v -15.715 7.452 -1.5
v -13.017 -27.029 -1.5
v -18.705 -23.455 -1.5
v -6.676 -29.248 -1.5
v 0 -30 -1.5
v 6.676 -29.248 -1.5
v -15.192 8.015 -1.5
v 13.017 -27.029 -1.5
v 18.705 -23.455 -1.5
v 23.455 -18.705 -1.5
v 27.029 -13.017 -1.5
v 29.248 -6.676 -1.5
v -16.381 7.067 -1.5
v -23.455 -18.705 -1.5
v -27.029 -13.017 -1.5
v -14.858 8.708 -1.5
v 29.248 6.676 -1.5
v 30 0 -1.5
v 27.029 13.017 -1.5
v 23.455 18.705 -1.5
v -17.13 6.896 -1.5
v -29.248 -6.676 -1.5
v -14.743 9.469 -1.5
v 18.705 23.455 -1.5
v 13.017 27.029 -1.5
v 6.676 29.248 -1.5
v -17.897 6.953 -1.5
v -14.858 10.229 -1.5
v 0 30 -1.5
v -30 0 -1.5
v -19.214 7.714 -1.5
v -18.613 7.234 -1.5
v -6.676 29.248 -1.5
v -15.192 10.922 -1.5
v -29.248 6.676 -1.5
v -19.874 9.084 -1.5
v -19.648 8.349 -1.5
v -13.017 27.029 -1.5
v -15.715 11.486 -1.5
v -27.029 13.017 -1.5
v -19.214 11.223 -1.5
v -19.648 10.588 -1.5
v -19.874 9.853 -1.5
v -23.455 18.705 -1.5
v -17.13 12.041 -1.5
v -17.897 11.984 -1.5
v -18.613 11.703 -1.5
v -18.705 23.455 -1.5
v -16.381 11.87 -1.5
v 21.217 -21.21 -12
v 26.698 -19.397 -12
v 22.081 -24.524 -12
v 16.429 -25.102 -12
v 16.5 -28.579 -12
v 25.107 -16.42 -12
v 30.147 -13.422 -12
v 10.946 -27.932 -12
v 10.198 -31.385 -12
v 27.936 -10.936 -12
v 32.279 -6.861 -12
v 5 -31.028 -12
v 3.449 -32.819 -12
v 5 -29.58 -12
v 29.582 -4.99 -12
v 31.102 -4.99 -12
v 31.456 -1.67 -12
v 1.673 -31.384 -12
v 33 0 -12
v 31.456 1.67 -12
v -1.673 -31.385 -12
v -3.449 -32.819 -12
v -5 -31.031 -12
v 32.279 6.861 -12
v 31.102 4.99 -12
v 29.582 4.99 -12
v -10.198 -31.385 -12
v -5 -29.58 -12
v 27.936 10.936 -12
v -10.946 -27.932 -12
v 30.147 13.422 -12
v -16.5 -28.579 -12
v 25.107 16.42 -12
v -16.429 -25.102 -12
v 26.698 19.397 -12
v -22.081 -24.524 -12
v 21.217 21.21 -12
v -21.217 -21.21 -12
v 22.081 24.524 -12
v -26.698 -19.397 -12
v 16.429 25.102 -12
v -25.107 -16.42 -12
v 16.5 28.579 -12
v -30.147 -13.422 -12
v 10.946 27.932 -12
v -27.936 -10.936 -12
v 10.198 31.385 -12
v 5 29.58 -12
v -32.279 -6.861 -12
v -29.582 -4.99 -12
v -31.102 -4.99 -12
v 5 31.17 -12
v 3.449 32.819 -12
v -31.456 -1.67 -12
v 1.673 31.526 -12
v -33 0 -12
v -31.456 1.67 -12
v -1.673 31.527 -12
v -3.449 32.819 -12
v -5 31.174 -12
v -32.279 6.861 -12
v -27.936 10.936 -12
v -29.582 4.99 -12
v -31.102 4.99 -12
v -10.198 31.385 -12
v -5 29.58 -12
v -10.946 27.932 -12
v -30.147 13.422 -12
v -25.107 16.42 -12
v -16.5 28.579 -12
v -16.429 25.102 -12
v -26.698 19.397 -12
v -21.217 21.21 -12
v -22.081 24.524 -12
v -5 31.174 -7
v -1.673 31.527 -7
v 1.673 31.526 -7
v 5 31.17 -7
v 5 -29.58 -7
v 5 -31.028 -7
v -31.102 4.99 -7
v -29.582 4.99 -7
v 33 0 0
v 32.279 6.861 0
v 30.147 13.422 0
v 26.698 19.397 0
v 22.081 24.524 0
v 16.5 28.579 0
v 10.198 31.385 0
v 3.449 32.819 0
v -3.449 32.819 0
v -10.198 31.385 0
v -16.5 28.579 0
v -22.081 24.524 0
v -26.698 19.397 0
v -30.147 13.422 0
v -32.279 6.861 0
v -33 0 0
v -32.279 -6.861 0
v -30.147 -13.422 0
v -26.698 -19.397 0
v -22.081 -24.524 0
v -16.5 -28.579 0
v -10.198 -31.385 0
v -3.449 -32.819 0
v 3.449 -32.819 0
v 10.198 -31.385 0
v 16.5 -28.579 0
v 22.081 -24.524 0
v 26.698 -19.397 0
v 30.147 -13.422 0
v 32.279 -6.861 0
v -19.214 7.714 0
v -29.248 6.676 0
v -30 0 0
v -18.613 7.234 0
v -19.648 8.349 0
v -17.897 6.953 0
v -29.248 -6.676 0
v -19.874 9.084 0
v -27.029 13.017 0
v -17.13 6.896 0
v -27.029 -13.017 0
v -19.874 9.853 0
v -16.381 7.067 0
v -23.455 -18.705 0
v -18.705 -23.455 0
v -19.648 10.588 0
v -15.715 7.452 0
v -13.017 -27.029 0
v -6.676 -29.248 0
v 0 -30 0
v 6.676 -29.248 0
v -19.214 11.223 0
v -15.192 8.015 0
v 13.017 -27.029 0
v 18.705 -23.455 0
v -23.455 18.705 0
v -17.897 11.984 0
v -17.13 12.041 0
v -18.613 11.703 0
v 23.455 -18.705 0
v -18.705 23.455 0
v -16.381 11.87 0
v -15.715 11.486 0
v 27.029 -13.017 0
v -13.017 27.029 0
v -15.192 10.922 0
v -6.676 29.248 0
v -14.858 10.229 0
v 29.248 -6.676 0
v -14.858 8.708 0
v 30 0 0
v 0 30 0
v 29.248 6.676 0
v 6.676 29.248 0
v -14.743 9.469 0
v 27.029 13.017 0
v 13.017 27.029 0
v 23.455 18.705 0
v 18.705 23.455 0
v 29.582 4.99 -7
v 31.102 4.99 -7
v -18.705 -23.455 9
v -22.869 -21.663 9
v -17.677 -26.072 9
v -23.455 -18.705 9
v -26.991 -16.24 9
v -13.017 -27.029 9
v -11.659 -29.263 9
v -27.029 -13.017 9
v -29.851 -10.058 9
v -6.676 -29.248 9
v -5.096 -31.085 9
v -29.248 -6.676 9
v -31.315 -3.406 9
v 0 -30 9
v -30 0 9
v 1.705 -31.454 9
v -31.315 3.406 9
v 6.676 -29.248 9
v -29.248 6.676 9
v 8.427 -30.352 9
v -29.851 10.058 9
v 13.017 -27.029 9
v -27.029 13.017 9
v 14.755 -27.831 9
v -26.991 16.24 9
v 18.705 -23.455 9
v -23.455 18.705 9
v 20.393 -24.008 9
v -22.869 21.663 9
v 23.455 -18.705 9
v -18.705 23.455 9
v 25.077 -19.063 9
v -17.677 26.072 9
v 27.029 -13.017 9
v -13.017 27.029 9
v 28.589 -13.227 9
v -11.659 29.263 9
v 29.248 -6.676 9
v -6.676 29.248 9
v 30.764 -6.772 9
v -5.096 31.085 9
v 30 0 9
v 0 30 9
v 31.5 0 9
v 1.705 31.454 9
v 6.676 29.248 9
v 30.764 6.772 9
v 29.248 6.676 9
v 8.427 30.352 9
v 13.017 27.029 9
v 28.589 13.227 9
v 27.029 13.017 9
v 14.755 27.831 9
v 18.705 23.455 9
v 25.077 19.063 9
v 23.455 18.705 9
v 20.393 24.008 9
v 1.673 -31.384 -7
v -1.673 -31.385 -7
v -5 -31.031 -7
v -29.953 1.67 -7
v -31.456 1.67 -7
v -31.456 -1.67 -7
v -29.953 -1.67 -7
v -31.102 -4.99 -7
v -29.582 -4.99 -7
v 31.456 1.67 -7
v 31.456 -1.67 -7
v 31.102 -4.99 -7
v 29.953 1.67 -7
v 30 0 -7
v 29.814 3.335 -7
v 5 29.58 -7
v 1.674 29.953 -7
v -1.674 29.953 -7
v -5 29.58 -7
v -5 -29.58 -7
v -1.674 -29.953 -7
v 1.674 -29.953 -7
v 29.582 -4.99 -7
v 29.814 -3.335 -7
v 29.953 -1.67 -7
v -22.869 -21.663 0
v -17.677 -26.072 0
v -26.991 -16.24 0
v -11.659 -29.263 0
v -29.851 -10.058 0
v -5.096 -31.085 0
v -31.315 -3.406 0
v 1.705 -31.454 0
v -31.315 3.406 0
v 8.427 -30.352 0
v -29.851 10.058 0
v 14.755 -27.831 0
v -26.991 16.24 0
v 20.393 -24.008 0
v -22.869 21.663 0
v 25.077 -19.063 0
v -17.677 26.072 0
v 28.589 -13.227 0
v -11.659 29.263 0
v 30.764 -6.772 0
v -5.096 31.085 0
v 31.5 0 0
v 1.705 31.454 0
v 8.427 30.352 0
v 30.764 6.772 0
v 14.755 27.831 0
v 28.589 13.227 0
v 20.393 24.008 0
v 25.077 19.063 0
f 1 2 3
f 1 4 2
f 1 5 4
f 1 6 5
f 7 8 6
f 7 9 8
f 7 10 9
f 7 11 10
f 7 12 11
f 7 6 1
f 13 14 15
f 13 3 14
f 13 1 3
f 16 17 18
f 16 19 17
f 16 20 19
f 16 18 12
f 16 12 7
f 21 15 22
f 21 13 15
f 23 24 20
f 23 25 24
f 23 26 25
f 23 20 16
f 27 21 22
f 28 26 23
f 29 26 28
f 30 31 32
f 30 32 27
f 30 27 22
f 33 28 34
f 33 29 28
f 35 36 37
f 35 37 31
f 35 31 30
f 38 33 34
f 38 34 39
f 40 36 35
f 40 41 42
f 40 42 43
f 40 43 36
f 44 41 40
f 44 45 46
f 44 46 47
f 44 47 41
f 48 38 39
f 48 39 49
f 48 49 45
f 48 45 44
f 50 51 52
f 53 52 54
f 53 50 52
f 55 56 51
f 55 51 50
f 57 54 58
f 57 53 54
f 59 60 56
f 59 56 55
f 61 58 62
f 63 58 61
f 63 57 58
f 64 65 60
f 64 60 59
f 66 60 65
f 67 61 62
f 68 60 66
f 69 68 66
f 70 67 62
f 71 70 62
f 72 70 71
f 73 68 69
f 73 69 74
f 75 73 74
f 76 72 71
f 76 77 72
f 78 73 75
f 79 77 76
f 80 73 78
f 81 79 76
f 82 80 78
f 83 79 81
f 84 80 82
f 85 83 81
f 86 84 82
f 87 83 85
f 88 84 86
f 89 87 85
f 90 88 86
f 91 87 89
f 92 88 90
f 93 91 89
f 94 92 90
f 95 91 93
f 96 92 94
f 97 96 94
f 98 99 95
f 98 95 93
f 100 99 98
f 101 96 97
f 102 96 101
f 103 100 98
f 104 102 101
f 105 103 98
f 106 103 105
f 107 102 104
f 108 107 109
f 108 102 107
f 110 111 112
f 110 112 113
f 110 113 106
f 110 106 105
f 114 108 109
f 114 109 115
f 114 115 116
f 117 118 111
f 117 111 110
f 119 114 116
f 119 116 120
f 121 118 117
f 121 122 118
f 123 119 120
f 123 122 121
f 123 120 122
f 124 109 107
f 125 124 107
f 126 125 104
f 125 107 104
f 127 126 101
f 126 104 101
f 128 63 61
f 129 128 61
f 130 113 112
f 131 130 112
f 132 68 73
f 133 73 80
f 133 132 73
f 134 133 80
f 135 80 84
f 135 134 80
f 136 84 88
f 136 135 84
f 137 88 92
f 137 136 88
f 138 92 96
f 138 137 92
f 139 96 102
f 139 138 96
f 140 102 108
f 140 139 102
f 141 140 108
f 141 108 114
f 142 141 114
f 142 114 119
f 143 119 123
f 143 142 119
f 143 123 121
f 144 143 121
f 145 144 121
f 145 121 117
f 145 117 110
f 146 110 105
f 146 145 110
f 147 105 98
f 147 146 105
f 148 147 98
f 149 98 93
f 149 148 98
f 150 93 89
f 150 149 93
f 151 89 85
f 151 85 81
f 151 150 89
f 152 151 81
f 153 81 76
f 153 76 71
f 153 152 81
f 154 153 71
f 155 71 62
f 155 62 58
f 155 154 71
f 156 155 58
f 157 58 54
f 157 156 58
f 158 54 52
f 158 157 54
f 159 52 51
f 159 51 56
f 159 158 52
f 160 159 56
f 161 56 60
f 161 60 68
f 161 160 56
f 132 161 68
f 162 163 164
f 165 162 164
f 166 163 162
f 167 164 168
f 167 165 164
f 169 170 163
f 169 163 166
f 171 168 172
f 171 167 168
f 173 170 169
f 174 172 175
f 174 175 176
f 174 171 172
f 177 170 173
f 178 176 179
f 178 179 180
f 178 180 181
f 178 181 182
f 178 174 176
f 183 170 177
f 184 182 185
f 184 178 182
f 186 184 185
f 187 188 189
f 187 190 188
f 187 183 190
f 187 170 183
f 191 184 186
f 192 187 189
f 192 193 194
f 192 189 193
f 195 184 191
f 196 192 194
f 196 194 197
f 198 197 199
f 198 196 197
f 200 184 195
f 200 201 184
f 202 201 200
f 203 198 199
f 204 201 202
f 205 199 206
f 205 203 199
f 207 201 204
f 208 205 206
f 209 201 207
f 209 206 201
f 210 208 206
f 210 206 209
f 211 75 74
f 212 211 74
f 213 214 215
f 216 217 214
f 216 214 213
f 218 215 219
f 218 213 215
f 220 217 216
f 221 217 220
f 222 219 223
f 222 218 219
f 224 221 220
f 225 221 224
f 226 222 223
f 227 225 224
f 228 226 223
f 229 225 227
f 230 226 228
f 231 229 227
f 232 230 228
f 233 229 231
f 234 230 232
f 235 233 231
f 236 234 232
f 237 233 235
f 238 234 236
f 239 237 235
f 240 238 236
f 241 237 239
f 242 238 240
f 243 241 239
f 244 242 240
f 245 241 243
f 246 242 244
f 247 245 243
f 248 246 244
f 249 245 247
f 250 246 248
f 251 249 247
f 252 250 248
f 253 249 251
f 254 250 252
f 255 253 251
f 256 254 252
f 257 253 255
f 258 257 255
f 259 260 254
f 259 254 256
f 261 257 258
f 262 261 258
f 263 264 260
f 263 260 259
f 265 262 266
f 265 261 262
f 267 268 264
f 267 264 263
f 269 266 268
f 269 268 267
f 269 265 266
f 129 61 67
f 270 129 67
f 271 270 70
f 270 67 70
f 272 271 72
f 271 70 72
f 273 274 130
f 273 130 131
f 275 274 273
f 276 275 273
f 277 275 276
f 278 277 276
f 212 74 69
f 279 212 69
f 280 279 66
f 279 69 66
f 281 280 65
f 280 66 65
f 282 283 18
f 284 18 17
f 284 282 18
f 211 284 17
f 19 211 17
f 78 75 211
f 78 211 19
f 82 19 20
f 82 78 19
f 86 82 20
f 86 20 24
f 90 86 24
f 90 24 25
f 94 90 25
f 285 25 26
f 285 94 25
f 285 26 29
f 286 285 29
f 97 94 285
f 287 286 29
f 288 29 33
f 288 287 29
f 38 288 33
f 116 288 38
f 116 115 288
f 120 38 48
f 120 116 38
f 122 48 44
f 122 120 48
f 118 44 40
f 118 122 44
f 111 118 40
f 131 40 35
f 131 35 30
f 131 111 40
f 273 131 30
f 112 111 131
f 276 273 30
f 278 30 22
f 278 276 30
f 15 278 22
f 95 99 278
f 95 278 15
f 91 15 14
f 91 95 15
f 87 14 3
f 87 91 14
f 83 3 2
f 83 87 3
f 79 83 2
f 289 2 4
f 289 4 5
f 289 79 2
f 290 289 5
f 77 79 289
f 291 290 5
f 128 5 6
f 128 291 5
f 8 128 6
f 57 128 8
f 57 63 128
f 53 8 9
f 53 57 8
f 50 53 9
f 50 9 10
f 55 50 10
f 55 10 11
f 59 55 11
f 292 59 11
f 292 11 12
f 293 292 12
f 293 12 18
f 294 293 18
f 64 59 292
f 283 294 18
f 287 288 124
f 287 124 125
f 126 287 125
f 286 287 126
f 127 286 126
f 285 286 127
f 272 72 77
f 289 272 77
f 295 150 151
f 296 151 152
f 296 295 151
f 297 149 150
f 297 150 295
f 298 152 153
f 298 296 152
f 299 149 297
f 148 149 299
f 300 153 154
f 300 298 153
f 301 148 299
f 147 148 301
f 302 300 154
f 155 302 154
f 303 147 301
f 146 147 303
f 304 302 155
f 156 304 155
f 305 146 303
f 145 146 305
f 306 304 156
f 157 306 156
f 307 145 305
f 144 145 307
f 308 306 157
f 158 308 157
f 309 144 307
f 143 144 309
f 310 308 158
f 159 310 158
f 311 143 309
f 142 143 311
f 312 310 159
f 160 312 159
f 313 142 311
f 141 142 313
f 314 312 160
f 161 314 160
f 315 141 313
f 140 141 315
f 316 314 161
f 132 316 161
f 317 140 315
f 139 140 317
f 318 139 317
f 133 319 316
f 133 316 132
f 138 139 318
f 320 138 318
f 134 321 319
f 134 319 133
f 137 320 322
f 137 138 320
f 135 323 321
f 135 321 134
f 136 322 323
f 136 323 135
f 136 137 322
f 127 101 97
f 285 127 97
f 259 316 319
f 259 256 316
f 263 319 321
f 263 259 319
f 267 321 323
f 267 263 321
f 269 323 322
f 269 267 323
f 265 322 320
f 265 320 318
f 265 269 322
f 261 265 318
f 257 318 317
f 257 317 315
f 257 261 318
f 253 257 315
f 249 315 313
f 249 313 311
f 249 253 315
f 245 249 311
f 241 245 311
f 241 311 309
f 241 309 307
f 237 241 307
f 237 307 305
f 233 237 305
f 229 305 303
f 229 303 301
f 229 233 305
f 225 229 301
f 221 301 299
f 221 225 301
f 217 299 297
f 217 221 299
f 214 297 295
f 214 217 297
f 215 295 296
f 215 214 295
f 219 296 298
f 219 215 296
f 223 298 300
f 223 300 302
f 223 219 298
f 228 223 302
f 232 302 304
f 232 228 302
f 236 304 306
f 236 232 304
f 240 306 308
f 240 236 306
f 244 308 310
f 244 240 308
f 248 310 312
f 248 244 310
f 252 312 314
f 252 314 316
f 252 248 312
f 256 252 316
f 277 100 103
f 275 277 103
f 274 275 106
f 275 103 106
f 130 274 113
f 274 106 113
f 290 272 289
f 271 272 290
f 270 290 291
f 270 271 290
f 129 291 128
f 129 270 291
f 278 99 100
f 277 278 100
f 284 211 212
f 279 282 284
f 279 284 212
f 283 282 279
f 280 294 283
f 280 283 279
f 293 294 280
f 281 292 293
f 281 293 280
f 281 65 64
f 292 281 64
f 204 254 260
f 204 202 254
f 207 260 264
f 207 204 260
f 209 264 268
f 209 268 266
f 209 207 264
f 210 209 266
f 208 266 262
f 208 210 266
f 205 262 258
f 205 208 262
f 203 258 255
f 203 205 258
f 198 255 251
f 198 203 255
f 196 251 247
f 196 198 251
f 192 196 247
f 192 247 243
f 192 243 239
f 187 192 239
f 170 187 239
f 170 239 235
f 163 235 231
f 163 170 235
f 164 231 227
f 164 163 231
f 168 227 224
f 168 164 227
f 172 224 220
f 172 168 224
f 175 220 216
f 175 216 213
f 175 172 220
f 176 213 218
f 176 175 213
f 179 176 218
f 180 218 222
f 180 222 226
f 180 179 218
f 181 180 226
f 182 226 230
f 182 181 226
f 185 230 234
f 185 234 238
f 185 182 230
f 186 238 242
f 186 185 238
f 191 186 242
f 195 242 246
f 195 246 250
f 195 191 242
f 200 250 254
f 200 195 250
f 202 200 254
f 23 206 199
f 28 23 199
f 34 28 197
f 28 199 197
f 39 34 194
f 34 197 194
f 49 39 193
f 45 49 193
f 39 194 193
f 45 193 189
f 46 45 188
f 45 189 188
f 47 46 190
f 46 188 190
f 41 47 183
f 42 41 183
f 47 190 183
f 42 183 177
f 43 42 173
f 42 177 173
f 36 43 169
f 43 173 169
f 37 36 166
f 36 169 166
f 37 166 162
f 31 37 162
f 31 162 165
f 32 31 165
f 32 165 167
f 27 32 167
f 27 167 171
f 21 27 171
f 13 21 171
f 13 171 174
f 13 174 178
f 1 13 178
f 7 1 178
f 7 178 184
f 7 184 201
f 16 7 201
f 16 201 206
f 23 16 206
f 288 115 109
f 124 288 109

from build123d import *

# Parameters (mm, degrees)
F3_DEPTH = 5
F4_R     = 2.58
F5_DEPTH = 25


# Not quite as in the source:
# - ends of sketch curves that miss each other by under 0.0002 mm in the source are joined


with BuildPart() as f1:
    # F0 (on Front) → F1 (revolve)
    with BuildSketch(Plane.XZ):
        Polygon((30, 0), (0, 0), (0, -1.5), (30, -1.5), (30, -12), (33, -12), (33, 0), (31.5, 0), (31.5, 9), (30, 9), align=None)
    revolve(axis=Axis((0, 0, -0.75), (0, 0, 1)))

    # F2 (on face) → F3 (cut)
    with BuildSketch(Plane(origin=(0, 0, -12), x_dir=(1, 0, 0), z_dir=(0, 0, -1))):
        with BuildLine():
            Line((-5, 31.030934304), (-5, 29.5803989155))
            ThreePointArc((-5, 29.5803989155), (0, 30), (5, 29.5803989155))
            Line((5, 29.5803989155), (5, 31.0276464719))
            ThreePointArc((5, 31.0276464719), (0.0001313019, 31.4286473296), (-5, 31.030934304))
        make_face()
        with BuildLine():
            Line((-29.5821256825, 4.9897735526), (-31.1022785476, 4.9897735526))
            ThreePointArc((-31.1022785476, 4.9897735526), (-31.5, 0), (-31.1022852718, -4.9897746313))
            Line((-31.1022852718, -4.9897746313), (-29.5821255005, -4.9897746313))
            ThreePointArc((-29.5821255005, -4.9897746313), (-30, -5.47e-07), (-29.5821256825, 4.9897735526))
        make_face()
        with BuildLine():
            ThreePointArc((5, -29.5803989155), (0, -30), (-5, -29.5803989155))
            Line((-5, -29.5803989155), (-5, -31.1736362396))
            ThreePointArc((-5, -31.1736362396), (0.0001313019, -31.5713492653), (5, -31.1703484075))
            Line((5, -31.1703484075), (5, -29.5803989155))
        make_face()
        with BuildLine():
            Line((31.1022785476, 4.9897735526), (29.5821256825, 4.9897735526))
            ThreePointArc((29.5821256825, 4.9897735526), (29.8953488897, 2.5036203312), (30, 0))
            ThreePointArc((30, 0), (29.8953488441, -2.5036208763), (29.5821255005, -4.9897746313))
            Line((29.5821255005, -4.9897746313), (31.1022852718, -4.9897746313))
            ThreePointArc((31.1022852718, -4.9897746313), (31.5, 0), (31.1022785476, 4.9897735526))
        make_face()
    extrude(amount=-F3_DEPTH, mode=Mode.SUBTRACT)

    # F4 (on face) → F5 (cut)
    with BuildSketch(Plane.XY.offset(9)):
        with Locations((-17.3232257366, 9.4686336815)):
            Circle(F4_R)
    extrude(amount=-F5_DEPTH, mode=Mode.SUBTRACT)


solid = f1.part
